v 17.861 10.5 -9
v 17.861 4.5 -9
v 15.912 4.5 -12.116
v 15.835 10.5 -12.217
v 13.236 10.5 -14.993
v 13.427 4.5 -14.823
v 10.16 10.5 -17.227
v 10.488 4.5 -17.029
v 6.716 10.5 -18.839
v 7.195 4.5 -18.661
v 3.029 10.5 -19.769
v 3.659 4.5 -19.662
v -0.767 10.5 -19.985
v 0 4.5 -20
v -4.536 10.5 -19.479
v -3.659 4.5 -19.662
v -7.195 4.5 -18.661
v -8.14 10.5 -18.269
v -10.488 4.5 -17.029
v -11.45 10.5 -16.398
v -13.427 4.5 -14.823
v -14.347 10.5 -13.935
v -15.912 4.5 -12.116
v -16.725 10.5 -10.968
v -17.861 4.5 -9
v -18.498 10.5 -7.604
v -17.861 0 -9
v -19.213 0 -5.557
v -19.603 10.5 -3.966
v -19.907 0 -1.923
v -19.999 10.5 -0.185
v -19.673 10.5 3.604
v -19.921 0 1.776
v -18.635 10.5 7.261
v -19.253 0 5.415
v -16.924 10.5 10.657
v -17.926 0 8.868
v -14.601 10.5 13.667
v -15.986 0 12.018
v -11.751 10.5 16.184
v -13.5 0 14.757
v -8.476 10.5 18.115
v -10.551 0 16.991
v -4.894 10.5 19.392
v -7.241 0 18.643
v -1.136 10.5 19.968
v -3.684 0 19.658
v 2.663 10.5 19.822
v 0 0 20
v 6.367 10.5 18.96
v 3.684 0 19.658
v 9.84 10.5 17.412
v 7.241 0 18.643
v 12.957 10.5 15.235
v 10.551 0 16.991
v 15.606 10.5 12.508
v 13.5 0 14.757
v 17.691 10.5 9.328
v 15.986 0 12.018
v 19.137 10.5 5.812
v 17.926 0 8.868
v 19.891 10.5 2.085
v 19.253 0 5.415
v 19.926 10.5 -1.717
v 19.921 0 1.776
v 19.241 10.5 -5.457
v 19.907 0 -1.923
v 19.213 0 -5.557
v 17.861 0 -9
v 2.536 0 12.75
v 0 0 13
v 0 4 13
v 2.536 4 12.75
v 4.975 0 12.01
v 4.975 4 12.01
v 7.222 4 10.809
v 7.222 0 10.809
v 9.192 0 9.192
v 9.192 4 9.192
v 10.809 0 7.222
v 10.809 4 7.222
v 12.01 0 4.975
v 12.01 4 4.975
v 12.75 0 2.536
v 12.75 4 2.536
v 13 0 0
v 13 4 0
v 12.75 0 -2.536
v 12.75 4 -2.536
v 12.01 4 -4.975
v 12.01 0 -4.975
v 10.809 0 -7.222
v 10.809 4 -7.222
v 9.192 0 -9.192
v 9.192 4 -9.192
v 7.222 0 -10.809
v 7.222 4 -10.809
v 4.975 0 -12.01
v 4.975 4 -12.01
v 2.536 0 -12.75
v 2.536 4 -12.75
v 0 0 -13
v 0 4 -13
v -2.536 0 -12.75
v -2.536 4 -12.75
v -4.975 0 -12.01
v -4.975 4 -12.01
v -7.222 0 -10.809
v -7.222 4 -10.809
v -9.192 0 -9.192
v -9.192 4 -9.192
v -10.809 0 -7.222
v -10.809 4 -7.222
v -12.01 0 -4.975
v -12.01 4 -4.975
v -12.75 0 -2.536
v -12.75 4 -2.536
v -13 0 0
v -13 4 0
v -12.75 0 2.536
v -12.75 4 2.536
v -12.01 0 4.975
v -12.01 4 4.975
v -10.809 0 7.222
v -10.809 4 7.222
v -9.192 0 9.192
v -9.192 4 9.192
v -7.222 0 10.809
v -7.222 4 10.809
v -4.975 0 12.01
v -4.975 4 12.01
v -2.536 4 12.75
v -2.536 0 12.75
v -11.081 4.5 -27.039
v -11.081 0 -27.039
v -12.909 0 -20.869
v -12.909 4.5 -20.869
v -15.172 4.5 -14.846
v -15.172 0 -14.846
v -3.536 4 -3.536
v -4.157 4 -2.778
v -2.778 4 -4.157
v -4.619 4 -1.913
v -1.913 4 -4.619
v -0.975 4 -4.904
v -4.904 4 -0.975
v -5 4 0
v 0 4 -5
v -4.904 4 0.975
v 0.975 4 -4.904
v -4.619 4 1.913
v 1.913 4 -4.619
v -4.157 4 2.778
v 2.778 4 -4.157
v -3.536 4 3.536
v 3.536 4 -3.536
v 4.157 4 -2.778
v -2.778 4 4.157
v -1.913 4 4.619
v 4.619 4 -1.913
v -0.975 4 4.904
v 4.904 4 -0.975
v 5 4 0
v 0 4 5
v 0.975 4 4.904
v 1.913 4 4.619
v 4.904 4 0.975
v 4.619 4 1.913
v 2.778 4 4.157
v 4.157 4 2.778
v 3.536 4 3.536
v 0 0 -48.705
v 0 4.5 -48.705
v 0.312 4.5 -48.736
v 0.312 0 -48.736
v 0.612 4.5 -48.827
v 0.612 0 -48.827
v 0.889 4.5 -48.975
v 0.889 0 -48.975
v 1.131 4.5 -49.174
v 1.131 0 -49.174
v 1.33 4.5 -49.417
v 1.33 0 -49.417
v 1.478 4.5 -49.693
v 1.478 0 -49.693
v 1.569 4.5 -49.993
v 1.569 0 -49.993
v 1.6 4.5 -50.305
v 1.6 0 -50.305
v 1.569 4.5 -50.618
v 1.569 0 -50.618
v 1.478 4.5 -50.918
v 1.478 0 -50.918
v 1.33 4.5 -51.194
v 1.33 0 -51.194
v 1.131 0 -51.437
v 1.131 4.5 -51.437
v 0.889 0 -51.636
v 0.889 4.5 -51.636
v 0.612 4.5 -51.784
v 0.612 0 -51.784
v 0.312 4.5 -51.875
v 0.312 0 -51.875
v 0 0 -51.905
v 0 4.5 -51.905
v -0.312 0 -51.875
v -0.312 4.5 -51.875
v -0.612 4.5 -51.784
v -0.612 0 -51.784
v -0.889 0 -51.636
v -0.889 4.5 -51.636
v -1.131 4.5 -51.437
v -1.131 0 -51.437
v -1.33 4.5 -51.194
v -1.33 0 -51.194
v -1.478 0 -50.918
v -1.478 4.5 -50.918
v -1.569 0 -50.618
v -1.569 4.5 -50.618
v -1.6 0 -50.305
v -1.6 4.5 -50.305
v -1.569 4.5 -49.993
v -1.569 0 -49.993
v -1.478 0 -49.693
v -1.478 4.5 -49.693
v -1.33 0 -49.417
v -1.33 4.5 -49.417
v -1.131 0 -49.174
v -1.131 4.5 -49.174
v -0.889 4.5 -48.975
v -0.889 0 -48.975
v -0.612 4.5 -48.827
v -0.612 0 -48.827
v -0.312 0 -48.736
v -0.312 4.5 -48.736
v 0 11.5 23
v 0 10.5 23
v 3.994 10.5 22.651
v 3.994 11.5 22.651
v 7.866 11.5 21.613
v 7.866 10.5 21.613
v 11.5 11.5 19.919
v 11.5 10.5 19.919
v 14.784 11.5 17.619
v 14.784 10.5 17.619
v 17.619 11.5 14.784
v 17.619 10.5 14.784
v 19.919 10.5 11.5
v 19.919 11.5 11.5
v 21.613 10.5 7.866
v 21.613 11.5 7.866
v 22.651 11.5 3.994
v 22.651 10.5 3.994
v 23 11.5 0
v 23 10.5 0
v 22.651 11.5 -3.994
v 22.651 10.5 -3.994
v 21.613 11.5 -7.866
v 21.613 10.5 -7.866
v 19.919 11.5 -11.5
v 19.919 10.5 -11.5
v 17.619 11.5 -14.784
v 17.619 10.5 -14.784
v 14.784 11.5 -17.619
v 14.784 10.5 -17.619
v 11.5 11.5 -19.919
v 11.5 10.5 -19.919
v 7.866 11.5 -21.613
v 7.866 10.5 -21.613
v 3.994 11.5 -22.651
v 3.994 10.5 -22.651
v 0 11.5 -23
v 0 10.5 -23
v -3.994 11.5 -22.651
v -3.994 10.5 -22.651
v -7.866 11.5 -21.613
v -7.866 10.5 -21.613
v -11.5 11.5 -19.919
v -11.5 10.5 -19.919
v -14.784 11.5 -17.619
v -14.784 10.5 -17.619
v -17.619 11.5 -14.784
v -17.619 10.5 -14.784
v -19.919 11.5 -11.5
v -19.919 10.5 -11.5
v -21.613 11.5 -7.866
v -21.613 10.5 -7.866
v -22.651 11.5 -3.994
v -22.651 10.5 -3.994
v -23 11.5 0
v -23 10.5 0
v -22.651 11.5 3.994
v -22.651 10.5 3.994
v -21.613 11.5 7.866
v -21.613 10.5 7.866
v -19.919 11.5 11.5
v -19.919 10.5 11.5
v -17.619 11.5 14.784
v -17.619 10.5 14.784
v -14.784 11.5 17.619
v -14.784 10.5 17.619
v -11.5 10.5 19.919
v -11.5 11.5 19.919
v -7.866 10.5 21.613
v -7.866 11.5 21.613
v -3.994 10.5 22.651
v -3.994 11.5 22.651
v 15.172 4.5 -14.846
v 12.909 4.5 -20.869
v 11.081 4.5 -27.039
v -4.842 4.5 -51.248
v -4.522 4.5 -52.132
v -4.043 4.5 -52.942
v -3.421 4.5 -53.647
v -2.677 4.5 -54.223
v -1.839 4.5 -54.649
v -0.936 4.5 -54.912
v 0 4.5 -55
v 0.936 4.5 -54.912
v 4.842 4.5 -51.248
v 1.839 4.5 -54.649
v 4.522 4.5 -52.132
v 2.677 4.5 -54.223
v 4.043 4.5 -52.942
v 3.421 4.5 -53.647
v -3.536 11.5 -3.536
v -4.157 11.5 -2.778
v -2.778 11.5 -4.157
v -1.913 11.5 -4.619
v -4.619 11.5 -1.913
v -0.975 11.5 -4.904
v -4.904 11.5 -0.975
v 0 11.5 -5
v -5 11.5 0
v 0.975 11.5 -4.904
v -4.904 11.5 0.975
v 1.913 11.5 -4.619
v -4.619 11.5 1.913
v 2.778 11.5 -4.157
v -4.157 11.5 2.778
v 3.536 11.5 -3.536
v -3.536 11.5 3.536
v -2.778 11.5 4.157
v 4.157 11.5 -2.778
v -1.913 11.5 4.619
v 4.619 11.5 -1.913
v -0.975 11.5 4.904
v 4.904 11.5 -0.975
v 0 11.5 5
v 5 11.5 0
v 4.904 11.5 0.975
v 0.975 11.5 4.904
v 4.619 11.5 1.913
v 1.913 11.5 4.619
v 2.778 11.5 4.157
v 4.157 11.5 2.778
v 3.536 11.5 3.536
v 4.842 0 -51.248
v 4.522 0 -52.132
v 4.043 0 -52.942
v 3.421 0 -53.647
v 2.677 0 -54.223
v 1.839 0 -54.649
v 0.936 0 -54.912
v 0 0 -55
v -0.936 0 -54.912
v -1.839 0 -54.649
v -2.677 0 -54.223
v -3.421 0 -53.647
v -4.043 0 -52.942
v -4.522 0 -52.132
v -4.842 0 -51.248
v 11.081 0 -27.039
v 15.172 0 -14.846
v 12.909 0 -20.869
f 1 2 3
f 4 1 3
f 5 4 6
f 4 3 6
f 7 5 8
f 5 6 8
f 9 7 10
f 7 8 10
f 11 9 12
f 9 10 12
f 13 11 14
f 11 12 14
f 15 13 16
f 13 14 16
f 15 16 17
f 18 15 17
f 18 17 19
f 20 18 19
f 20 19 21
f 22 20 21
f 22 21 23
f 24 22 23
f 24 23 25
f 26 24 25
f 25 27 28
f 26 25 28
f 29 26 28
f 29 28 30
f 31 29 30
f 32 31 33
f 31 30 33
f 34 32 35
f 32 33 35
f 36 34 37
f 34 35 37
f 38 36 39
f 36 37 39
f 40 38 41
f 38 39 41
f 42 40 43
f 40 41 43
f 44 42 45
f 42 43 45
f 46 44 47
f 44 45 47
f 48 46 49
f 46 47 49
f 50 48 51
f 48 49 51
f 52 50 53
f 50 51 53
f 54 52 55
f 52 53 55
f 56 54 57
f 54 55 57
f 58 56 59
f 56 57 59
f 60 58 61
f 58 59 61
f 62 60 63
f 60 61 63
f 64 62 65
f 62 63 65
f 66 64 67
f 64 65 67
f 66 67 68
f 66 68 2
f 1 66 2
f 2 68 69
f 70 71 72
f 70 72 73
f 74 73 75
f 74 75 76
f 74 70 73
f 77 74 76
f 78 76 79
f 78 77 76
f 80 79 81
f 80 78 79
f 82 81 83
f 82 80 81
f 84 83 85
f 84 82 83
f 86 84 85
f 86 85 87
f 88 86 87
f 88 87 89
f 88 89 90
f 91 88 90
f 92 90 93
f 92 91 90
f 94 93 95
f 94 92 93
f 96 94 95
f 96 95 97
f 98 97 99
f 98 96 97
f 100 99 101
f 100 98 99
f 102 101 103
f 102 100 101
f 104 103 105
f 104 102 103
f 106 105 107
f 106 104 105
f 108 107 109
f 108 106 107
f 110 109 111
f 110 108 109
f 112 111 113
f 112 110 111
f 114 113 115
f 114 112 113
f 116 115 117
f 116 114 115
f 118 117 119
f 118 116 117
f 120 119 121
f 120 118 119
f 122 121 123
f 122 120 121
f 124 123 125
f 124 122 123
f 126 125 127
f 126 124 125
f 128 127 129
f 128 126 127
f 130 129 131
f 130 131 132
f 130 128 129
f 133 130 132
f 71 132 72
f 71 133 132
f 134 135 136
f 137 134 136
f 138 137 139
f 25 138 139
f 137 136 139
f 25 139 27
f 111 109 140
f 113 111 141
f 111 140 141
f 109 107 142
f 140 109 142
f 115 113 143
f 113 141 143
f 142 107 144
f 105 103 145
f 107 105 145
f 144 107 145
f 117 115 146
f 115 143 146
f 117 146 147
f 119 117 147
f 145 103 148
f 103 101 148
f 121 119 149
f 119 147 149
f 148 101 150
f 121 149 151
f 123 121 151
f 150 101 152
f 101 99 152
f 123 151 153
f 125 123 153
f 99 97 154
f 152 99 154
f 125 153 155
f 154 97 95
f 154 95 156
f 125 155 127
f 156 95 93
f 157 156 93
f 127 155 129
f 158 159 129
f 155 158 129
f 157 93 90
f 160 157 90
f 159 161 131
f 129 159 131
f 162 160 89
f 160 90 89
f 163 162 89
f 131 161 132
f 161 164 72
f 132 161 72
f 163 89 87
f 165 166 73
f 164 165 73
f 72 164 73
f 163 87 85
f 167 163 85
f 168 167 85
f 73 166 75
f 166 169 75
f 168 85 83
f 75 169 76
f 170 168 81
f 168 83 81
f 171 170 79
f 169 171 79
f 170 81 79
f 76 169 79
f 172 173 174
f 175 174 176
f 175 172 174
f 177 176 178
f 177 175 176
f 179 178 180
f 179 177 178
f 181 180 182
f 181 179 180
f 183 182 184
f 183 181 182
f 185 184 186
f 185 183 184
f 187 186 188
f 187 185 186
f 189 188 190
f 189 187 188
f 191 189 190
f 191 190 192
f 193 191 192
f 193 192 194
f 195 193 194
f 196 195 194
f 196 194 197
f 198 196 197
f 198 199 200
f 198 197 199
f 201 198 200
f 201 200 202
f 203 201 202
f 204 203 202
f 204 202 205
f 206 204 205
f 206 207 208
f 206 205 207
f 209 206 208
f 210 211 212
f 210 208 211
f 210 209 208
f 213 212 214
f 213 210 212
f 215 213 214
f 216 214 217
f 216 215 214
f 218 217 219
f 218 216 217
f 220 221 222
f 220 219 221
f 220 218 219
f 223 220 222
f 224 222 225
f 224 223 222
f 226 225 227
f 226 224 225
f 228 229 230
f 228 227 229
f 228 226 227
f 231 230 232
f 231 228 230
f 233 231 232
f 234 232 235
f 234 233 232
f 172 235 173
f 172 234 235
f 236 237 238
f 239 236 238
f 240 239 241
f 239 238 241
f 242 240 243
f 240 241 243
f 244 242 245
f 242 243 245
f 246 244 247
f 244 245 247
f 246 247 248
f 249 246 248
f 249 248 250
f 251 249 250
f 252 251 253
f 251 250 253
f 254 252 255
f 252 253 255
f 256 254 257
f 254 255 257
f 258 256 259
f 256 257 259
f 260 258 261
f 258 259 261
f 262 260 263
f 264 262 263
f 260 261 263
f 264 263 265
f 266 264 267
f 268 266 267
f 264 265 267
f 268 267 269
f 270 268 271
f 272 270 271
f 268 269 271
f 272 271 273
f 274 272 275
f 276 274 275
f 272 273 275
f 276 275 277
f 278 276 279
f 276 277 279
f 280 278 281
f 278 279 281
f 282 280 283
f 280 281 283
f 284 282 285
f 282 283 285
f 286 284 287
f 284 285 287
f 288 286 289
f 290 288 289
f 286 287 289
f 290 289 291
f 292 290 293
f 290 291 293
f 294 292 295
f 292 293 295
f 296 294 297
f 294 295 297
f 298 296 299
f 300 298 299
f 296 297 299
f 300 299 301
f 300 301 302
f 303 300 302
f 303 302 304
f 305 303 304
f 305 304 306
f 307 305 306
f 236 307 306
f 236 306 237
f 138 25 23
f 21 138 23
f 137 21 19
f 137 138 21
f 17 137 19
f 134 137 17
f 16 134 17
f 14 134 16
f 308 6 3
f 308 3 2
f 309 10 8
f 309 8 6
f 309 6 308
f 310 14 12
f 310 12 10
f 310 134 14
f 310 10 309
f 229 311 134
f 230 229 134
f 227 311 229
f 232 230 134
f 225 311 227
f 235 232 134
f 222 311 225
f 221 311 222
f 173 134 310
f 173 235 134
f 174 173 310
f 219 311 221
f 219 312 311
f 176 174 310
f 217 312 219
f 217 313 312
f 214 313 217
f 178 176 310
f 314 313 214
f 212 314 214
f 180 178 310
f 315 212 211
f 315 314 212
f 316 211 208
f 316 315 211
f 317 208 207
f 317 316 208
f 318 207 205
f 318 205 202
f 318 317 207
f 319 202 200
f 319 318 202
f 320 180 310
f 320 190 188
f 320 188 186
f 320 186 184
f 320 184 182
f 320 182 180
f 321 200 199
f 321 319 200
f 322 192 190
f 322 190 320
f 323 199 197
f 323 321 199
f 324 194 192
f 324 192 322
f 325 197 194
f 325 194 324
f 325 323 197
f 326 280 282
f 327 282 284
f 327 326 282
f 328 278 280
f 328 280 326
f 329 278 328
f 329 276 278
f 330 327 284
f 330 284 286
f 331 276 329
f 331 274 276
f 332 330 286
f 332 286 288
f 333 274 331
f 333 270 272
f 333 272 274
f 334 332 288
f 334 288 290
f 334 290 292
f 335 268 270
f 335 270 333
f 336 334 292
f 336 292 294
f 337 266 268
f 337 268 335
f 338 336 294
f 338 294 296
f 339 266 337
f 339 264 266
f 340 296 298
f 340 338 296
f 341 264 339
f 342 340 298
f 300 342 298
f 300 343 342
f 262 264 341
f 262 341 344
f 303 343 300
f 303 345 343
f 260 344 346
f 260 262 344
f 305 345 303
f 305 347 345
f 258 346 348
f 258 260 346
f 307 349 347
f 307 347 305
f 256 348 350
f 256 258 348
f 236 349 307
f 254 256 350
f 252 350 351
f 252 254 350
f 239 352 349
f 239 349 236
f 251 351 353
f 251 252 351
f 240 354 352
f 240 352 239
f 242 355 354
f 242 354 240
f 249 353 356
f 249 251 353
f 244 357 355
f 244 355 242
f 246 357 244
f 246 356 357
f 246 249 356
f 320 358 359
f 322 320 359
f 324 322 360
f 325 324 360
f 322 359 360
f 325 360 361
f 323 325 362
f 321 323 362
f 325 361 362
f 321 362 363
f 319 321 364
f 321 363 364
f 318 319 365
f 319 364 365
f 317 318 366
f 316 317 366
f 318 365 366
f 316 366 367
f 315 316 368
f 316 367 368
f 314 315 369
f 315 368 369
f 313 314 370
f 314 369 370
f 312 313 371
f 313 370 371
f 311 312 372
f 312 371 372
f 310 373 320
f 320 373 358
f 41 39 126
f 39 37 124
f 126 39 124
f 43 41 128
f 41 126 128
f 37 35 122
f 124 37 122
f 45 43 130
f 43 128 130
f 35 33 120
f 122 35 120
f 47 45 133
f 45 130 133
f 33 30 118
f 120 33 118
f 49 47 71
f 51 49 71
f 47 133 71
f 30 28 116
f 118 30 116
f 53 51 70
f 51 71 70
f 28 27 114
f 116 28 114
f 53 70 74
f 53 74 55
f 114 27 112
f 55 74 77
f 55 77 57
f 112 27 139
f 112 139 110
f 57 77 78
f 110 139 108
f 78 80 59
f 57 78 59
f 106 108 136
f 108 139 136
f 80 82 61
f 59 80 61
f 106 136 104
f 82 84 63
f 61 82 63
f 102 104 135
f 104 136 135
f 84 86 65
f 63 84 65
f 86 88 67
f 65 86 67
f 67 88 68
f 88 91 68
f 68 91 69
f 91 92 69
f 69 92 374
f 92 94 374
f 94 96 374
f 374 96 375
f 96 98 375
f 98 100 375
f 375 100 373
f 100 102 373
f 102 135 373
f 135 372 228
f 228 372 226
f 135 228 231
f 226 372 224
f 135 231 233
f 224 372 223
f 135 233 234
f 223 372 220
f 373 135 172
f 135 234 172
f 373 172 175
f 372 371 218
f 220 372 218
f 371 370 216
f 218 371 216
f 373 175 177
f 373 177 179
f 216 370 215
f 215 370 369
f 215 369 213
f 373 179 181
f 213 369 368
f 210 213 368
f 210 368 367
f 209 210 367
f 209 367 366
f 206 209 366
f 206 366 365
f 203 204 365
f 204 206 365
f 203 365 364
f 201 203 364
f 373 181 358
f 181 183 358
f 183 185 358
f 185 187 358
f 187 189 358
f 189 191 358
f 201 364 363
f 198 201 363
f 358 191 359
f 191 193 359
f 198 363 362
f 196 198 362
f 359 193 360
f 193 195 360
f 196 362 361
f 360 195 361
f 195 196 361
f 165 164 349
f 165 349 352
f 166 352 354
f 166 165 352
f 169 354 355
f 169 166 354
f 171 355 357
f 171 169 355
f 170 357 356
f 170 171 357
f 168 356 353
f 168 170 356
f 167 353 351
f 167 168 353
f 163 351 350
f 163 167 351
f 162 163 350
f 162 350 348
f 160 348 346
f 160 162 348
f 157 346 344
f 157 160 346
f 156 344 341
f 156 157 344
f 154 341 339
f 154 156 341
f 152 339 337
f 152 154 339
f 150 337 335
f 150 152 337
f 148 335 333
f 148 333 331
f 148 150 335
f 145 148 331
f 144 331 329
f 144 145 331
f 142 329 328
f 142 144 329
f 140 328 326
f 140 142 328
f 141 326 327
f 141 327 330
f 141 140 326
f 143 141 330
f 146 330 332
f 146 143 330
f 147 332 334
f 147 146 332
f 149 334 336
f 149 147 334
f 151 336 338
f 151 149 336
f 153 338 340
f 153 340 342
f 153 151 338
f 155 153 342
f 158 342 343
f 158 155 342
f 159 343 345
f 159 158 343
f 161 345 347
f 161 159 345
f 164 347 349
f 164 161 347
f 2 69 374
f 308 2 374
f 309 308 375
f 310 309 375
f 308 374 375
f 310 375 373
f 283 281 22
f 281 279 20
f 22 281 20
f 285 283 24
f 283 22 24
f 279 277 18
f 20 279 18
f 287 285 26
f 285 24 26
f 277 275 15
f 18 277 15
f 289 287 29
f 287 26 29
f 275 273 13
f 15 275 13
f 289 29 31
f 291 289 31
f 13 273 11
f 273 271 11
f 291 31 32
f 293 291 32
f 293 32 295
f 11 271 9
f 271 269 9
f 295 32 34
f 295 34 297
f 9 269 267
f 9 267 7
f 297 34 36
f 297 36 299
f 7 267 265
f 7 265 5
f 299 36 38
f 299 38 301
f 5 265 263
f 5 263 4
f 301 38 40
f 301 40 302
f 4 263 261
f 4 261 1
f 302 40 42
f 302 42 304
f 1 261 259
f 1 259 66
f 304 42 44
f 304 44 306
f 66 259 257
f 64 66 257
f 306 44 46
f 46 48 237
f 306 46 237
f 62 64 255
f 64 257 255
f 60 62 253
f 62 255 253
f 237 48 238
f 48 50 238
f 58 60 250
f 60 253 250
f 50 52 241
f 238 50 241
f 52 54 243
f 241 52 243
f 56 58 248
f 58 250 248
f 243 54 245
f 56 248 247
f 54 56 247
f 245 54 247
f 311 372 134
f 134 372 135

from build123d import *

# Parameters (mm, degrees)
SKETCH1_R           = 5
BOSS_EXTRUDE1_DEPTH = 4.5
CUT_EXTRUDE2_REACH  = 60.696
SKETCH3_R           = 1.6
SKETCH1_4_R         = 20
SKETCH1_4_R_2       = 5
BOSS_EXTRUDE2_DEPTH = 10.5
BOSS_EXTRUDE3_START = 10.5
SKETCH4_R           = 23
SKETCH4_R_2         = 5
BOSS_EXTRUDE3_DEPTH = 1
SKETCH2_R           = 13
CUT_EXTRUDE1_DEPTH  = 4


with BuildPart() as part:
    # Sketch1 → Boss-Extrude1 (new body)
    with BuildSketch(Plane(origin=(0, 0, 0), x_dir=(1, 0, 0), z_dir=(0, 1, 0))):
        with BuildLine():
            Line((-4.841786735, 51.247838615), (-11.080979808, 27.038904937))
            ThreePointArc((-11.080979808, 27.038904937), (-13.986571903, 17.837473452), (-17.860571099, 9))
            ThreePointArc((-17.860571099, 9), (0, -20), (17.860571099, 9))
            ThreePointArc((17.860571099, 9), (13.986571903, 17.837473452), (11.080979808, 27.038904937))
            Line((11.080979808, 27.038904937), (4.841786735, 51.247838615))
            ThreePointArc((4.841786735, 51.247838615), (0, 55), (-4.841786735, 51.247838615))
        make_face()
        with Locations(Location((0, 0, 0), (0, 0, 270))):
            Circle(SKETCH1_R, mode=Mode.SUBTRACT)
    extrude(amount=BOSS_EXTRUDE1_DEPTH)

    # Sketch3 → Cut-Extrude2 (cut, up to next)
    with BuildSketch(Plane(origin=(0, 0, 0), x_dir=(1, 0, 0), z_dir=(0, 1, 0)), mode=Mode.PRIVATE) as cut_extrude2_sk1:
        with Locations(Location((0, 50.305422276, 0), (0, 0, 270))):
            Circle(SKETCH3_R)
    cut_extrude2_tool1 = extrude(cut_extrude2_sk1.sketch, amount=CUT_EXTRUDE2_REACH, mode=Mode.PRIVATE) & part.part
    add(cut_extrude2_tool1.solids().sort_by_distance((0, 0, -50.305422))[0], mode=Mode.SUBTRACT)

    # Sketch1<4> → Boss-Extrude2 (add)
    with BuildSketch(Plane(origin=(0, 0, 0), x_dir=(1, 0, 0), z_dir=(0, 1, 0))):
        with Locations(Location((0, 0, 0), (0, 0, 26.74368395))):
            Circle(SKETCH1_4_R)
        with Locations(Location((0, 0, 0), (0, 0, 270))):
            Circle(SKETCH1_4_R_2, mode=Mode.SUBTRACT)
    extrude(amount=BOSS_EXTRUDE2_DEPTH)

    # Sketch4 → Boss-Extrude3 (add)
    with BuildSketch(Plane(origin=(0, 0, 0), x_dir=(1, 0, 0), z_dir=(0, 1, 0)).offset(BOSS_EXTRUDE3_START)):
        with Locations(Location((0, 0, 0), (0, 0, 270))):
            Circle(SKETCH4_R)
        with Locations(Location((0, 0, 0), (0, 0, 270))):
            Circle(SKETCH4_R_2, mode=Mode.SUBTRACT)
    extrude(amount=BOSS_EXTRUDE3_DEPTH)

    # Sketch2 → Cut-Extrude1 (cut)
    with BuildSketch(Plane(origin=(0, 0, 0), x_dir=(1, 0, 0), z_dir=(0, 1, 0))):
        with Locations(Location((0, 0, 0), (0, 0, 270))):
            Circle(SKETCH2_R)
    extrude(amount=CUT_EXTRUDE1_DEPTH, mode=Mode.SUBTRACT)


solid = part.part
